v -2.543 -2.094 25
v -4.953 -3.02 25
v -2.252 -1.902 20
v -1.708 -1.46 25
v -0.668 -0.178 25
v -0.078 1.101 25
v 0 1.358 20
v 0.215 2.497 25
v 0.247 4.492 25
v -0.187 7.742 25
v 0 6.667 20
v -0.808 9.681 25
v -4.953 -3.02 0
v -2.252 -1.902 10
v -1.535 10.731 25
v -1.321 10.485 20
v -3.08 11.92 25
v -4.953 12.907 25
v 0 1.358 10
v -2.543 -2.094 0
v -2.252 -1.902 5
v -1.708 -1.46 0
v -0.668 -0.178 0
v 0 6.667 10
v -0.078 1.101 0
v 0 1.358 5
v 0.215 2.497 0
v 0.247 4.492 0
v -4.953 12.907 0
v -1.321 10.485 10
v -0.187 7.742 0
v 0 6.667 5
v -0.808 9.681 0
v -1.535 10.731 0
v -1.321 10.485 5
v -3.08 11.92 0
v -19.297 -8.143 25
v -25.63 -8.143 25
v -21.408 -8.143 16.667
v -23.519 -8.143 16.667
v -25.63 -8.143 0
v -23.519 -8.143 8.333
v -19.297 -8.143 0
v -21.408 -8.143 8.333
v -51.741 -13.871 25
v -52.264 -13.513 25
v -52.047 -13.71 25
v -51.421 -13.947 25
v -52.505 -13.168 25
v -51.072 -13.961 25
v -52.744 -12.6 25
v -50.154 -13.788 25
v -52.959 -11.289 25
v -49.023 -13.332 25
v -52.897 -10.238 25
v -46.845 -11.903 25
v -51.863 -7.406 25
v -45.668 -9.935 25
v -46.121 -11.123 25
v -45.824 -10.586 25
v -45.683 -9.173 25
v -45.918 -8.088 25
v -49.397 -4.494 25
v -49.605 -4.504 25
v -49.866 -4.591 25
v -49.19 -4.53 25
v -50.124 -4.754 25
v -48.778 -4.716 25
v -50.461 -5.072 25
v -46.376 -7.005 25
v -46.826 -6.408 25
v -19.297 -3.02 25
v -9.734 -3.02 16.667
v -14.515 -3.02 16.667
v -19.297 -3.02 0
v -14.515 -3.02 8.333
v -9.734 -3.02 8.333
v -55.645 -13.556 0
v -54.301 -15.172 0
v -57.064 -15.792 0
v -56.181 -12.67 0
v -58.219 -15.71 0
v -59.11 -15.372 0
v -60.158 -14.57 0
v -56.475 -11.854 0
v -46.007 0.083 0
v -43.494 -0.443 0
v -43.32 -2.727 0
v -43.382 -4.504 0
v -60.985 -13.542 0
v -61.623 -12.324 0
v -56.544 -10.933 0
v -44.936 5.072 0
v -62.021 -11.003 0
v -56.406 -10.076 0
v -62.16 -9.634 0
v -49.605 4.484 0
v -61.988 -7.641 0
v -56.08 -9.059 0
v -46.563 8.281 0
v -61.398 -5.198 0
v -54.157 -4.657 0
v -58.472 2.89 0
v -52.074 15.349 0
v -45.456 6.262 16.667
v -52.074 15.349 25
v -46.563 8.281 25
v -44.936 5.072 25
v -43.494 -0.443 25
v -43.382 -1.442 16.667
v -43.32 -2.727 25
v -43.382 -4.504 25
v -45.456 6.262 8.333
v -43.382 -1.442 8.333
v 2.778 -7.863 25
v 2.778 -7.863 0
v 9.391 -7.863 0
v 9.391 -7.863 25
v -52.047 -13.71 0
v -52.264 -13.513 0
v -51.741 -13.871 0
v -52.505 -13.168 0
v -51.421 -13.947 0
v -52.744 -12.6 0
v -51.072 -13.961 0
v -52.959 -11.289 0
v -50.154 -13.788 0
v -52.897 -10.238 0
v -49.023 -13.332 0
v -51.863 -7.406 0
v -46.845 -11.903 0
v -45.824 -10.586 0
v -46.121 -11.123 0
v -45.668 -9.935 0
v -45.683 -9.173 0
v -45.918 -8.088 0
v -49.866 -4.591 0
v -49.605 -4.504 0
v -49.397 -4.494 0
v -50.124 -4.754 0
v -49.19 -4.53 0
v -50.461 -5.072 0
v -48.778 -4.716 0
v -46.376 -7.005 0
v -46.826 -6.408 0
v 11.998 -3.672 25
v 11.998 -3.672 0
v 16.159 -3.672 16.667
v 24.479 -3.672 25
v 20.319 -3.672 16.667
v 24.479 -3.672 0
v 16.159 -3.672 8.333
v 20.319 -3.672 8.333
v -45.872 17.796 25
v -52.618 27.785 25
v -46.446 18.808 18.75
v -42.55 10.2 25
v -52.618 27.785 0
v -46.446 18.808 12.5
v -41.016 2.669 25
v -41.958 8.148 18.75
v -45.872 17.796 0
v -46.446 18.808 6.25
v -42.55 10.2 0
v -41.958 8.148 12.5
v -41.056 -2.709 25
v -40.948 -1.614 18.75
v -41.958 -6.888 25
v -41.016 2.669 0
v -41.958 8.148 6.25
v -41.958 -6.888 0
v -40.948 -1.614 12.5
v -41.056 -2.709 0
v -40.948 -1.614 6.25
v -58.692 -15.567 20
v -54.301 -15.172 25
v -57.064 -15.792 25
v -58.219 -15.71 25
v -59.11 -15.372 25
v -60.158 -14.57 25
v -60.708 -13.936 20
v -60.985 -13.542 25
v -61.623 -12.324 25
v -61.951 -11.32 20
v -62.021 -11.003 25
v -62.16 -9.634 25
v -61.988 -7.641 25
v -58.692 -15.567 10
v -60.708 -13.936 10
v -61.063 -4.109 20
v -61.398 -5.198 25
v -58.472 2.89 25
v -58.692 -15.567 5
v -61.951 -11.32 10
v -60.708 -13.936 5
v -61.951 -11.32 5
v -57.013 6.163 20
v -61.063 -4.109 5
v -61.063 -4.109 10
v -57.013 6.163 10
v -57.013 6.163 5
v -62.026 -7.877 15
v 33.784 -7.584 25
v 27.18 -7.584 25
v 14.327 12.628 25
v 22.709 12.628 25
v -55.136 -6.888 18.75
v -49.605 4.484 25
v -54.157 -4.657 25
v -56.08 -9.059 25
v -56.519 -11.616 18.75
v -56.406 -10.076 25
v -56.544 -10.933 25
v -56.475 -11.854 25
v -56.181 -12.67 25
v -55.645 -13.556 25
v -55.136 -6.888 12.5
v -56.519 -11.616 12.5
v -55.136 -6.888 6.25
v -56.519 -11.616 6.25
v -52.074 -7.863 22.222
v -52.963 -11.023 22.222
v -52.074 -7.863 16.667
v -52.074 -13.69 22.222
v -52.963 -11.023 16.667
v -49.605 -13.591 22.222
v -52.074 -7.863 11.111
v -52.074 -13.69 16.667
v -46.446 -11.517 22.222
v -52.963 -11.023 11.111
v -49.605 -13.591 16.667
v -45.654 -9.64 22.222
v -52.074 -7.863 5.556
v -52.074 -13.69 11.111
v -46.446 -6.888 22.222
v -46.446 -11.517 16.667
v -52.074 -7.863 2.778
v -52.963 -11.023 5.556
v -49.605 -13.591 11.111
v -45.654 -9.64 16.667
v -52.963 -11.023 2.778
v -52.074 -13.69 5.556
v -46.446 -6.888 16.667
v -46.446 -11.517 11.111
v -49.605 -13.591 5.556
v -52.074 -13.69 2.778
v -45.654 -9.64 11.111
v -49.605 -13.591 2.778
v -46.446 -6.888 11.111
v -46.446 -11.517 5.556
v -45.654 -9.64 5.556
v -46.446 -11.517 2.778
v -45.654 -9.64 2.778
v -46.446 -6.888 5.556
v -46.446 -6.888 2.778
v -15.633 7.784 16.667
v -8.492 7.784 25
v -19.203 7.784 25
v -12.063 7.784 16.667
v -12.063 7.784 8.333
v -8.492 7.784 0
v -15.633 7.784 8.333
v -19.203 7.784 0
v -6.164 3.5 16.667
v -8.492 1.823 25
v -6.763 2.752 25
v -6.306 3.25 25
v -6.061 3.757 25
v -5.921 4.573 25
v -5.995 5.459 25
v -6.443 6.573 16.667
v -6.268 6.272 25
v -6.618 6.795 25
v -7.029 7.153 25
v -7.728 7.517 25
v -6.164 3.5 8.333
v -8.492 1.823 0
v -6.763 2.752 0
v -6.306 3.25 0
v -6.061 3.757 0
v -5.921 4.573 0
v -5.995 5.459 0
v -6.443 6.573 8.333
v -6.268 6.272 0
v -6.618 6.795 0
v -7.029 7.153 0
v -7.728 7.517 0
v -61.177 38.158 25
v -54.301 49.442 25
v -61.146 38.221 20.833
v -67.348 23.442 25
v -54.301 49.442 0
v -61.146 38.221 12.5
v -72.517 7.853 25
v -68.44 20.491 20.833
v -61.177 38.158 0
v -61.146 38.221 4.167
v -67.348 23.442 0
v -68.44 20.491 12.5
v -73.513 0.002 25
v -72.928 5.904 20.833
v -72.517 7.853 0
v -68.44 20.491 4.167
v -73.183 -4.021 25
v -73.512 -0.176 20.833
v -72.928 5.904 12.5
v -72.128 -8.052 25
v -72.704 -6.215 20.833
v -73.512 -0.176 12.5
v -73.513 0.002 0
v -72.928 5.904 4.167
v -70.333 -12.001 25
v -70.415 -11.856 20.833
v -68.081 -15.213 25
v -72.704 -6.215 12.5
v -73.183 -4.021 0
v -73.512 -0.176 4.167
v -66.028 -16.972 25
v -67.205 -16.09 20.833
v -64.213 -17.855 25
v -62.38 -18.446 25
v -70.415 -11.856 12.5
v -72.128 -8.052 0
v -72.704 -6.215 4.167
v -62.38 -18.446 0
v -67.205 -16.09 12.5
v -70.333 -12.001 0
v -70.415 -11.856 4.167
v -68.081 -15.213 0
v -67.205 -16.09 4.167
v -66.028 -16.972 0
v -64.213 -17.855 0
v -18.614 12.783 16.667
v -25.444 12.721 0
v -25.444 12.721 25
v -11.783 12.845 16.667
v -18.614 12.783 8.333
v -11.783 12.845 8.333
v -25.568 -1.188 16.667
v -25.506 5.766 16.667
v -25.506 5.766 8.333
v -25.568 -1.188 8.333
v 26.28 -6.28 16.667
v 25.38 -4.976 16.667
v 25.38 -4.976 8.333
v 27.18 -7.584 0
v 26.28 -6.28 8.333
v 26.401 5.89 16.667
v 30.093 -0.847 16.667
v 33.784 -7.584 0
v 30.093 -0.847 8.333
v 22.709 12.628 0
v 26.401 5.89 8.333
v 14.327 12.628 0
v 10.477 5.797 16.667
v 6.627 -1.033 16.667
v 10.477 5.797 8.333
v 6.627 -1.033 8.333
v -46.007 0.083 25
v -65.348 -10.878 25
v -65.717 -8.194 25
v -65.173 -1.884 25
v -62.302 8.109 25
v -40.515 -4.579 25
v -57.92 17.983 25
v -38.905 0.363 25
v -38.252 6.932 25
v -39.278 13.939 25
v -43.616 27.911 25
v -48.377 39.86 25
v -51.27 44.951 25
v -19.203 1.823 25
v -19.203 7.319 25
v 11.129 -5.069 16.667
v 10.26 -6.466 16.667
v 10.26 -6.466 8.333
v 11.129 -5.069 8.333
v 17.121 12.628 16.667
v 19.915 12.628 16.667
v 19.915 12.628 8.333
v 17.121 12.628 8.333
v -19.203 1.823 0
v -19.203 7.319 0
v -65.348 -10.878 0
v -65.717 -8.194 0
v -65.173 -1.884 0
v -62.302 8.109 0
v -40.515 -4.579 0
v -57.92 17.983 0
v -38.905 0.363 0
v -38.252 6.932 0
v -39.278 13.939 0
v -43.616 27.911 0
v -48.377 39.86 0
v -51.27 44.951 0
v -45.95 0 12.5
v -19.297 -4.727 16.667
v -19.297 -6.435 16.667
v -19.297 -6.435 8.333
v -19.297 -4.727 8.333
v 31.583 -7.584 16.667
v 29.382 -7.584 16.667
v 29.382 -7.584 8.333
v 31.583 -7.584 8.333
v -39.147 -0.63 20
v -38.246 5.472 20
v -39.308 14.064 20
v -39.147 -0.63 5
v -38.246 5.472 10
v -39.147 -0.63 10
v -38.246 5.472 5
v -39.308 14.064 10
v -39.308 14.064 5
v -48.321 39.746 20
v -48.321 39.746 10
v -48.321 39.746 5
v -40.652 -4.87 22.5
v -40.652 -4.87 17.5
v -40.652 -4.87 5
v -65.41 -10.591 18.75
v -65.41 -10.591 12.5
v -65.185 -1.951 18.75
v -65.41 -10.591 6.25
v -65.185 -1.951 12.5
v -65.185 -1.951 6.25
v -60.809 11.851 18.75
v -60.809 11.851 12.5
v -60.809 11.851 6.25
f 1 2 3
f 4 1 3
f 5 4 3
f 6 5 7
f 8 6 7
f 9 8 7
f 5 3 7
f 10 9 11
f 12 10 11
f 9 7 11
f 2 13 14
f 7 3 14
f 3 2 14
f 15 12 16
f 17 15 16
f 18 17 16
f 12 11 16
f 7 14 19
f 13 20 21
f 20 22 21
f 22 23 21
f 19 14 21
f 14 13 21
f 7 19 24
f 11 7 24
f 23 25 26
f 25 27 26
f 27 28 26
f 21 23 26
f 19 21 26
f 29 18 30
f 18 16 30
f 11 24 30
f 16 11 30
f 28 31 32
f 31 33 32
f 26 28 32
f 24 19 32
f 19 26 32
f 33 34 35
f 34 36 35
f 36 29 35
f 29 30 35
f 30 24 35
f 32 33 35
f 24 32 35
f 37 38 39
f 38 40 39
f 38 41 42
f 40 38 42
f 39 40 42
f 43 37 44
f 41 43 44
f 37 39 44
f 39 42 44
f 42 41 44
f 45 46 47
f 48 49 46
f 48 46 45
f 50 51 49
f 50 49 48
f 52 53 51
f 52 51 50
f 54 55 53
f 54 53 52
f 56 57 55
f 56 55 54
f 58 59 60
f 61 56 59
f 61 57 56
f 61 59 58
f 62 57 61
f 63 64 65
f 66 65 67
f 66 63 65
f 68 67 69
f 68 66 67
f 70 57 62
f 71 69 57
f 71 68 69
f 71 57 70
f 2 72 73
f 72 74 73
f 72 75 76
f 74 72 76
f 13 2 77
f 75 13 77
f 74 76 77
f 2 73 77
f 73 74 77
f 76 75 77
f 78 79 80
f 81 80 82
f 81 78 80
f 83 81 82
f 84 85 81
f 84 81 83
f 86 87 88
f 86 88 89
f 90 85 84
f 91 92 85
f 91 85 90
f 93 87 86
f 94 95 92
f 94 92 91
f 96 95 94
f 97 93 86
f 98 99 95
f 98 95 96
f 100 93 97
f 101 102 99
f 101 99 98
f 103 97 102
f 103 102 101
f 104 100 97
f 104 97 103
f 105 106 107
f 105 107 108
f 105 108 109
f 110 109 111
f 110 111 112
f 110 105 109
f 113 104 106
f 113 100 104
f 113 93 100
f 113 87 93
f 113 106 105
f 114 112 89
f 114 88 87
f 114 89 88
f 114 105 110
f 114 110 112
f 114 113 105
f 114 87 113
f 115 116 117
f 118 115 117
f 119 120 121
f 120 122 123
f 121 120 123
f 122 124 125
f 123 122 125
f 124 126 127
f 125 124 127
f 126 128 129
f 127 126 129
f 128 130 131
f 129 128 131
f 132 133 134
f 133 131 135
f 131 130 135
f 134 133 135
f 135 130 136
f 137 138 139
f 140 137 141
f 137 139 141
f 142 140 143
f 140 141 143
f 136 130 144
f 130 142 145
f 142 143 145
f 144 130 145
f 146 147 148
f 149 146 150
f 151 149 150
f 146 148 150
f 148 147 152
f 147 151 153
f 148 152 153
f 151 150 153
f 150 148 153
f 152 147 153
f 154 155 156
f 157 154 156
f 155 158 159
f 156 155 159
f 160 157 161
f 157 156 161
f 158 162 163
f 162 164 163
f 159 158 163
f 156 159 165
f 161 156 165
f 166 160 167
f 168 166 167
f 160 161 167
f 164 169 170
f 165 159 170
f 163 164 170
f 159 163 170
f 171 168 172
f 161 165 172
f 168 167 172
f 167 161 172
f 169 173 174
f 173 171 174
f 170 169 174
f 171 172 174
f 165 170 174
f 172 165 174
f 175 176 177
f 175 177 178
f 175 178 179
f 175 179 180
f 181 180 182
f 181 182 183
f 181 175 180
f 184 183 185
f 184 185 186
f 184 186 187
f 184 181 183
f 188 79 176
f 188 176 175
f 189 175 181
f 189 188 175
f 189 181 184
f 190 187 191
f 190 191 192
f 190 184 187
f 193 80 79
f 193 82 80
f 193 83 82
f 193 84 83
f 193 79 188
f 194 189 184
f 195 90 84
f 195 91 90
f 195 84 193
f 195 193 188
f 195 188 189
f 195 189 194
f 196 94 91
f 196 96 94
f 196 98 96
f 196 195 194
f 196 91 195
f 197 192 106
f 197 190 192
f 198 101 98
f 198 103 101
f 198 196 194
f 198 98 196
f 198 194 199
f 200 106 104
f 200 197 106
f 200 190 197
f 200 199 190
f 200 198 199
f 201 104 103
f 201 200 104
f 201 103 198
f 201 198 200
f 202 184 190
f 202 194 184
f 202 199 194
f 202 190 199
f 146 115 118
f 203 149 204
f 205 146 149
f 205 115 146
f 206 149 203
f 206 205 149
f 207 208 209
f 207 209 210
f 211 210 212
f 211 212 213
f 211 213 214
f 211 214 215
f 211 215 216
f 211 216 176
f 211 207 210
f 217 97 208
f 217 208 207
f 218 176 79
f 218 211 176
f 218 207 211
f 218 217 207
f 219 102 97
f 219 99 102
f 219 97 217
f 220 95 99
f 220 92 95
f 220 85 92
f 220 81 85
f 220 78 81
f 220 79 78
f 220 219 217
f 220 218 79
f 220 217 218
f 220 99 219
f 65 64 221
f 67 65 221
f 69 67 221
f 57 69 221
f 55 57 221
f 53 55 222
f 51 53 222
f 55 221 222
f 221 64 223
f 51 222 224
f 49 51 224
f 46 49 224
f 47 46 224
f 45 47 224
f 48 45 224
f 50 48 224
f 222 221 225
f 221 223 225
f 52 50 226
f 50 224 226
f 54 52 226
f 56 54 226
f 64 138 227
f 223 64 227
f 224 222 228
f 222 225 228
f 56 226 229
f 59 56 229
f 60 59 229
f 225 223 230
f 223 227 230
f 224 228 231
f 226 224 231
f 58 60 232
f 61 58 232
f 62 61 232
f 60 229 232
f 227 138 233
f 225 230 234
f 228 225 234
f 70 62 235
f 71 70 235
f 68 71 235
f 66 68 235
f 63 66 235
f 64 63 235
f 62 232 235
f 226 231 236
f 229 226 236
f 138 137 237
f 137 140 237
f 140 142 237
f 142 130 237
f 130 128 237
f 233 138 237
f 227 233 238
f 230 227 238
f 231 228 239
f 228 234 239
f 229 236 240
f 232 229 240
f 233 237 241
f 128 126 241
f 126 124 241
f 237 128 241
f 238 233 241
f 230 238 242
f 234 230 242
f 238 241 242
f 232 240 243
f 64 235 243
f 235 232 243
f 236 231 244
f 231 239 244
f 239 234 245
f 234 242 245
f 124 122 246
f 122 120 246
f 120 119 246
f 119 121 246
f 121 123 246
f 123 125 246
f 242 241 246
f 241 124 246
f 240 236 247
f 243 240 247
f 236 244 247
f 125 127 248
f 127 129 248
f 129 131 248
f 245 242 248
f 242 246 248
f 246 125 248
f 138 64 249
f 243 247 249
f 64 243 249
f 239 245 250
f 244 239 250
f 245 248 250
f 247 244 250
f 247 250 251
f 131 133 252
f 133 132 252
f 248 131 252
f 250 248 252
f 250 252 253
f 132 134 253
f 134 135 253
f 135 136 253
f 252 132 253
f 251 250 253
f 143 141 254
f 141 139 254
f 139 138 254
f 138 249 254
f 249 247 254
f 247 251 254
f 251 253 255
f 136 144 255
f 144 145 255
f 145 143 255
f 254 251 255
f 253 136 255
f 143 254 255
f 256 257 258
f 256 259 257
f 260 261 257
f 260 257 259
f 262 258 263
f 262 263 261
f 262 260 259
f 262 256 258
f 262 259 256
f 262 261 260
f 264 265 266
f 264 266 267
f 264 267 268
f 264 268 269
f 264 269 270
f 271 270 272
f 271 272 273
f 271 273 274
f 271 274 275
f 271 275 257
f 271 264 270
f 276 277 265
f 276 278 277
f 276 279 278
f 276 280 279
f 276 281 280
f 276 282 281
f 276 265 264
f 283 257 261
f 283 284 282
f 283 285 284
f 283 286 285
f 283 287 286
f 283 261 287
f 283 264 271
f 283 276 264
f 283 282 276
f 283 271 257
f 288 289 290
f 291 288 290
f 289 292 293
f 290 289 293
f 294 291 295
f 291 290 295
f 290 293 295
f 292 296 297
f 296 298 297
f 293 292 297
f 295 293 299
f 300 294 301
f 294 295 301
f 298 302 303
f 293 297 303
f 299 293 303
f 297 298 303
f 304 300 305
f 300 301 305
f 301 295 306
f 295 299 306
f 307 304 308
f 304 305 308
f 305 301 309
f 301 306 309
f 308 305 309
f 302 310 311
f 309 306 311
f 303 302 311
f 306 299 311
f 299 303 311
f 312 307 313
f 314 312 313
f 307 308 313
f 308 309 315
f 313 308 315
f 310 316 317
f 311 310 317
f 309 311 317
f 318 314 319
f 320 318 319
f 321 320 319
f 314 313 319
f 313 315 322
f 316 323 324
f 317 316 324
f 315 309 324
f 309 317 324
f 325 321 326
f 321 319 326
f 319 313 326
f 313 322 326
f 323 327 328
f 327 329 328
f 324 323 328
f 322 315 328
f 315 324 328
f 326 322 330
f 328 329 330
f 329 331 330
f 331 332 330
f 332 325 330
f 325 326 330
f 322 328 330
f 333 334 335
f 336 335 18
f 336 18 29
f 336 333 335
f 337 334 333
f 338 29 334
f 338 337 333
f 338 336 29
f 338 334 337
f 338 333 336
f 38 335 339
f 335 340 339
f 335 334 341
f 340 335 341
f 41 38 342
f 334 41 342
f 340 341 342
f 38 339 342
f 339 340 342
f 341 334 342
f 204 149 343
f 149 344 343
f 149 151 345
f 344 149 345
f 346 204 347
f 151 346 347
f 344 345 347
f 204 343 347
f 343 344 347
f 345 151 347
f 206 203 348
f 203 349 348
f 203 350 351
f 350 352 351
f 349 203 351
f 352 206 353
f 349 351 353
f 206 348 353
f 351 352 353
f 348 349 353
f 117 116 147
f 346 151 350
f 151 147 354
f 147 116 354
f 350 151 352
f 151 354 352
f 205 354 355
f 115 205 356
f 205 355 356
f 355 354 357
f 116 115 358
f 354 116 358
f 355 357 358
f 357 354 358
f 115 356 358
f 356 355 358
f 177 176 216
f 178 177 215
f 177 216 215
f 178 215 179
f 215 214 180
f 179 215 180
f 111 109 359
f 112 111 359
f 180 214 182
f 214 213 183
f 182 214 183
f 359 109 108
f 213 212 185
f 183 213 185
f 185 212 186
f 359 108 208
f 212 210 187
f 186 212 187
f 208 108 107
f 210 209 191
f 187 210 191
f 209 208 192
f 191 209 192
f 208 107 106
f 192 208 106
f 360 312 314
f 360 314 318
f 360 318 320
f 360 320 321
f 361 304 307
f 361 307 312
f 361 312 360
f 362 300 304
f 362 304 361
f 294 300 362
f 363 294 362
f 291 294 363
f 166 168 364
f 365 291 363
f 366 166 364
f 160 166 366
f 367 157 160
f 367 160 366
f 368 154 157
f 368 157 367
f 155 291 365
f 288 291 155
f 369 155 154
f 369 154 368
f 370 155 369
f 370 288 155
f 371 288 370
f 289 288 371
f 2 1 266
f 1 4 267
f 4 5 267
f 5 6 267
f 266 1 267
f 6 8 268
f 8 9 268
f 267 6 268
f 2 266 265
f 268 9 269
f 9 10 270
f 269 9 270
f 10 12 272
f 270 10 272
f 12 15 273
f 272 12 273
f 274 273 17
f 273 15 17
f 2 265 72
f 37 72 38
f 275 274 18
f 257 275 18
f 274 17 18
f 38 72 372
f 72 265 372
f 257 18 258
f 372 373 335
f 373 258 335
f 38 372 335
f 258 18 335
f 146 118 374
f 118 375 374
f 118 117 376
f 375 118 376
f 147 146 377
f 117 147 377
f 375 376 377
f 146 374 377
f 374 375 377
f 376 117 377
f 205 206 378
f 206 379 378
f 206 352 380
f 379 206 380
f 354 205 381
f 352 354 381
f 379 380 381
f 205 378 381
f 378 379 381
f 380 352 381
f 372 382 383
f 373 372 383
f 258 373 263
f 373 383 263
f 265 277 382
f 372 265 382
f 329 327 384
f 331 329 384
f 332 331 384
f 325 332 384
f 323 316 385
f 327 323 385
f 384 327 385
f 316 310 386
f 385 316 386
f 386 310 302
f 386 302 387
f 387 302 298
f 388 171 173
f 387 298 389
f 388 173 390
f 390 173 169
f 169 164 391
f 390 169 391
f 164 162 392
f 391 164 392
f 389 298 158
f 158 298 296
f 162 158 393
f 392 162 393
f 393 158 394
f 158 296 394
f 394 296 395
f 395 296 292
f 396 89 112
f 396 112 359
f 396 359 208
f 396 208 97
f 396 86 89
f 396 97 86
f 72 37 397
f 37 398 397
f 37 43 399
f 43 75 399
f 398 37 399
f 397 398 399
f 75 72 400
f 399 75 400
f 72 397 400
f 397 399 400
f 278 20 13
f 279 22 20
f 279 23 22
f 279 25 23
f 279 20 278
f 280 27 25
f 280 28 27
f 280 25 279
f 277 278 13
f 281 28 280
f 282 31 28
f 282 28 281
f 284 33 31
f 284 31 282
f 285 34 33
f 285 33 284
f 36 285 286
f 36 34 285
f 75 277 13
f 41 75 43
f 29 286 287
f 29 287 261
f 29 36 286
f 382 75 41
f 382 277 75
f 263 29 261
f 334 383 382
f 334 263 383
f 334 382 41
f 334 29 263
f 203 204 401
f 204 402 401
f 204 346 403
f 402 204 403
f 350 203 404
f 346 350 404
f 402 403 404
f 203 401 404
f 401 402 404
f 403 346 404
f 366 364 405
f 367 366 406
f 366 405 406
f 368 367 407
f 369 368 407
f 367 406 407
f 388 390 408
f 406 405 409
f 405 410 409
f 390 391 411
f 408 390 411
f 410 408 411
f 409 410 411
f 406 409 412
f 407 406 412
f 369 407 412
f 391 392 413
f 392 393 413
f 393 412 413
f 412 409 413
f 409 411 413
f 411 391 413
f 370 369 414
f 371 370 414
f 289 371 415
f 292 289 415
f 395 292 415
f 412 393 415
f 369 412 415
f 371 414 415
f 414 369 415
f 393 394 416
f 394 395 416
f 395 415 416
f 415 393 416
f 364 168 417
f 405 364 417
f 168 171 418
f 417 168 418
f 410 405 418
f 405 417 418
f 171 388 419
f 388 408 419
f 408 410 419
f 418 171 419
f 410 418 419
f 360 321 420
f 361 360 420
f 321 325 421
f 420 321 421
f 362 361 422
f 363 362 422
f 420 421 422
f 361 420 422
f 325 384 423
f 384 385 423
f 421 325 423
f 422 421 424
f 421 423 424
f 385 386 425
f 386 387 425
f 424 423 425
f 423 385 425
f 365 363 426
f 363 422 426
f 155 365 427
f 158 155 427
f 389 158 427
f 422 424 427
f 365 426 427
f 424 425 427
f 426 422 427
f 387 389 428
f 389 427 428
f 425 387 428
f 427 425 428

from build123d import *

# Parameters (mm, degrees)
F1_DEPTH = 25


with BuildPart() as f1:
    # F0 (on Top) → F1 (new body)
    with BuildSketch(Plane.XY):
        with BuildLine():
            add(Edge.make_bspline(
                [(-41.9576913118, -6.8883672357), (-41.5673358646, -6.405844601), (-40.3257218658, -4.871071967), (-36.6268515013, 6.4569250109), (-41.888383972, 22.9126051539), (-47.6062593685, 39.8160615159), (-52.2445315368, 46.4850153043), (-54.3009452522, 49.4417473674)],
                knots=[0, 0, 0, 0, 0.0904713648, 0.2877646867, 0.5420700343, 0.7969732202, 1, 1, 1, 1], degree=3))
            add(Edge.make_bspline(
                [(-54.3009452522, 49.4417473674), (-56.6245127919, 46.004743089), (-61.7542486483, 38.4168749578), (-68.4753149095, 20.5243591535), (-73.5796686045, 6.2834538502), (-73.8921084571, -6.0251397612), (-67.9934251663, -16.7878783638), (-64.006824621, -17.9655930829), (-62.3801648617, -18.4461381286)],
                knots=[0, 0, 0, 0, 0.1720572884, 0.3798505644, 0.5652547717, 0.7304797716, 0.8900271786, 1, 1, 1, 1], degree=3))
            add(Edge.make_bspline(
                [(-62.3801648617, -18.4461381286), (-63.62310697, -15.8479508859), (-66.1254432197, -10.6171858509), (-65.5783484616, -1.5758999211), (-61.1693984228, 12.4462867939), (-55.5676507776, 22.4938889957), (-52.6177734137, 27.7849510312)],
                knots=[0, 0, 0, 0, 0.209053081, 0.4208732645, 0.6950321656, 1, 1, 1, 1], degree=3))
            add(Edge.make_bspline(
                [(-52.6177734137, 27.7849510312), (-50.4636866552, 24.8953623282), (-46.0899977938, 19.0282996973), (-41.4299930238, 8.5543105111), (-40.5096135621, -1.4762334808), (-41.5256790902, -5.2737385131), (-41.9576913118, -6.8883672357)],
                knots=[0, 0, 0, 0, 0.2716158812, 0.5514928075, 0.8093030584, 1, 1, 1, 1], degree=3))
        make_face()
    extrude(amount=F1_DEPTH)


with BuildPart() as f1b:
    # F0 (on Top) → F1, piece 2 (new body)
    with BuildSketch(Plane.XY):
        with BuildLine():
            add(Edge.make_bspline(
                [(-54.3009452522, -15.1717299595), (-55.8182732839, -15.631838156), (-59.0076663574, -16.5989763518), (-62.9994129372, -11.1452431495), (-61.1788195389, -3.8303104318), (-57.2168858544, 6.3730874569), (-53.7720303589, 12.3857429005), (-52.074175328, 15.3491813689)],
                knots=[0, 0, 0, 0, 0.1536975661, 0.3230691996, 0.5203691576, 0.763605864, 1, 1, 1, 1], degree=3))
            add(Edge.make_bspline(
                [(-49.6048480272, 4.4841314666), (-50.4209135907, 3.1020925548), (-52.2272735252, 0.042951439), (-54.9835412089, -6.7619114207), (-57.435652053, -11.6598522373), (-55.3173477024, -14.0330329941), (-54.3009452522, -15.1717299595)],
                knots=[0, 0, 0, 0, 0.2439482649, 0.5399791285, 0.7792732943, 1, 1, 1, 1], degree=3))
            add(Edge.make_bspline(
                [(-43.3821380138, -4.5042280108), (-44.1658867861, -2.9818295146), (-45.7774817354, 0.1486248021), (-48.3059970245, 3.012838481), (-49.6048480272, 4.4841314666)],
                knots=[0, 0, 0, 0, 0.4863187072, 1, 1, 1, 1], degree=3))
            add(Edge.make_bspline(
                [(-52.074175328, 15.3491813689), (-49.5377585702, 12.4242643667), (-44.8644959882, 7.035203149), (-43.186499889, -1.2411944036), (-43.3280079894, -3.6013973941), (-43.3821380138, -4.5042280108)],
                knots=[0, 0, 0, 0, 0.4229460762, 0.7792639226, 1, 1, 1, 1], degree=3))
        make_face()
    extrude(amount=F1_DEPTH)


with BuildPart() as f1c:
    # F0 (on Top) → F1, piece 3 (new body)
    with BuildSketch(Plane.XY):
        with BuildLine():
            add(Edge.make_bspline(
                [(-49.6048480272, -4.5042280108), (-50.5433736889, -4.6687663832), (-52.2577599013, -8.1075176875), (-53.2570444245, -10.7419821808), (-52.4595683121, -14.3184464517), (-49.4275431362, -13.774126809), (-46.2608954823, -11.6964249922), (-45.3491672717, -9.739223844), (-46.2925375933, -6.6704537987), (-47.5817941371, -5.854146678), (-48.9071297656, -4.3819069791), (-49.6048480272, -4.5042280108)],
                knots=[0, 0, 0, 0, 0.1362793679, 0.2572290599, 0.3691433177, 0.4740752248, 0.6038306559, 0.6990984055, 0.8120566454, 0.8986872628, 1, 1, 1, 1], degree=3))
        make_face()
    extrude(amount=F1_DEPTH)


with BuildPart() as f1d:
    # F0 (on Top) → F1, piece 4 (new body)
    with BuildSketch(Plane.XY):
        with BuildLine():
            add(Edge.make_bspline(
                [(-25.4437588155, 12.7207208425), (-18.613509989, 12.7828139812), (-11.7832611625, 12.8449071199), (-4.953012336, 12.9070002586)],
                knots=[0, 0, 0, 0, 20.4915931862, 20.4915931862, 20.4915931862, 20.4915931862], degree=3))
            add(Edge.make_bspline(
                [(-25.4437588155, 12.7207208425), (-25.5058519542, 5.7662855834), (-25.5679450929, -1.1881496757), (-25.6300382316, -8.1425849348)],
                knots=[0, 0, 0, 0, 20.8641373648, 20.8641373648, 20.8641373648, 20.8641373648], degree=3))
            add(Edge.make_bspline(
                [(-25.6300382316, -8.1425849348), (-23.5188702742, -8.1425849348), (-21.4077023168, -8.1425849348), (-19.2965343595, -8.1425849348)],
                knots=[0, 0, 0, 0, 6.3335038722, 6.3335038722, 6.3335038722, 6.3335038722], degree=3))
            add(Edge.make_bspline(
                [(-19.2965343595, -8.1425849348), (-19.2965343595, -6.4350225342), (-19.2965343595, -4.7274601335), (-19.2965343595, -3.0198977329)],
                knots=[0, 0, 0, 0, 5.1226872019, 5.1226872019, 5.1226872019, 5.1226872019], degree=3))
            add(Edge.make_bspline(
                [(-19.2965343595, -3.0198977329), (-14.5153603517, -3.0198977329), (-9.7341863438, -3.0198977329), (-4.953012336, -3.0198977329)],
                knots=[0, 0, 0, 0, 14.3435220234, 14.3435220234, 14.3435220234, 14.3435220234], degree=3))
            add(Edge.make_bspline(
                [(-4.953012336, -3.0198977329), (-4.0254750418, -2.7604396842), (-2.0180779612, -2.1989147377), (0.6194293511, 1.2911331305), (0.0972323567, 6.656257704), (-0.8124248147, 10.8576916153), (-3.555134503, 12.2151459961), (-4.953012336, 12.9070002586)],
                knots=[0, 0, 0, 0, 0.1692146105, 0.3662180673, 0.594260818, 0.7932067652, 1, 1, 1, 1], degree=3))
        make_face()
        with BuildLine():
            Line((-19.2033946514, 1.8233696464), (-19.2033946514, 7.3186149821))
            add(Edge.make_bspline(
                [(-19.2033946514, 7.7843139879), (-19.2033946514, 7.629080986), (-19.2033946514, 7.473847984), (-19.2033946514, 7.3186149821)],
                knots=[0, 0, 0, 0, 0.4656990059, 0.4656990059, 0.4656990059, 0.4656990059], degree=3))
            add(Edge.make_bspline(
                [(-8.49232357, 7.7843139879), (-12.0626805971, 7.7843139879), (-15.6330376243, 7.7843139879), (-19.2033946514, 7.7843139879)],
                knots=[0, 0, 0, 0, 10.7110710815, 10.7110710815, 10.7110710815, 10.7110710815], degree=3))
            add(Edge.make_bspline(
                [(-8.49232357, 1.8233696464), (-7.5344311052, 2.2310746944), (-5.5830776866, 3.0616237053), (-6.0332760338, 6.9862959661), (-7.7088715367, 7.5300656123), (-8.49232357, 7.7843139879)],
                knots=[0, 0, 0, 0, 0.3392235658, 0.6910431903, 1, 1, 1, 1], degree=3))
            Line((-8.49232357, 1.8233696464), (-19.2033946514, 1.8233696464))
        make_face(mode=Mode.SUBTRACT)
    extrude(amount=F1_DEPTH)


with BuildPart() as f1e:
    # F0 (on Top) → F1, piece 5 (new body)
    with BuildSketch(Plane.XY):
        with BuildLine():
            add(Edge.make_bspline(
                [(14.3269179389, 12.6275811344), (10.4771410891, 5.7973324632), (6.6273642393, -1.0329162081), (2.7775873896, -7.8631648794)],
                knots=[0, 0, 0, 0, 23.5214308311, 23.5214308311, 23.5214308311, 23.5214308311], degree=3))
            Line((2.7775873896, -7.8631648794), (9.3905096874, -7.8631648794))
            add(Edge.make_bspline(
                [(9.3905096874, -7.8631648794), (10.25981425, -6.4660686379), (11.1291188126, -5.0689723964), (11.9984233752, -3.6718761548)],
                knots=[0, 0, 0, 0, 4.9364070918, 4.9364070918, 4.9364070918, 4.9364070918], degree=3))
            add(Edge.make_bspline(
                [(11.9984233752, -3.6718761548), (16.1586652199, -3.6718761548), (20.3189070647, -3.6718761548), (24.4791489094, -3.6718761548)],
                knots=[0, 0, 0, 0, 12.4807255343, 12.4807255343, 12.4807255343, 12.4807255343], degree=3))
            add(Edge.make_bspline(
                [(24.4791489094, -3.6718761548), (25.3795006623, -4.9758328435), (26.2798524151, -6.2797895322), (27.180204168, -7.5837462209)],
                knots=[0, 0, 0, 0, 4.7537802771, 4.7537802771, 4.7537802771, 4.7537802771], degree=3))
            add(Edge.make_bspline(
                [(27.180204168, -7.5837462209), (29.3815340608, -7.5837462209), (31.5828639536, -7.5837462209), (33.7841938465, -7.5837462209)],
                knots=[0, 0, 0, 0, 6.6039896785, 6.6039896785, 6.6039896785, 6.6039896785], degree=3))
            add(Edge.make_bspline(
                [(33.7841938465, -7.5837462209), (30.0926273832, -0.8466371025), (26.4010609199, 5.890472016), (22.7094944566, 12.6275811344)],
                knots=[0.212411668, 0.212411668, 0.212411668, 0.212411668, 23.2590322454, 23.2590322454, 23.2590322454, 23.2590322454], degree=3))
            add(Edge.make_bspline(
                [(22.7094944566, 12.6275811344), (19.9153022841, 12.6275811344), (17.1211101115, 12.6275811344), (14.3269179389, 12.6275811344)],
                knots=[0, 0, 0, 0, 8.3825765178, 8.3825765178, 8.3825765178, 8.3825765178], degree=3))
        make_face()
    extrude(amount=F1_DEPTH)


solid = Compound([f1.part, f1b.part, f1c.part, f1d.part, f1e.part])
